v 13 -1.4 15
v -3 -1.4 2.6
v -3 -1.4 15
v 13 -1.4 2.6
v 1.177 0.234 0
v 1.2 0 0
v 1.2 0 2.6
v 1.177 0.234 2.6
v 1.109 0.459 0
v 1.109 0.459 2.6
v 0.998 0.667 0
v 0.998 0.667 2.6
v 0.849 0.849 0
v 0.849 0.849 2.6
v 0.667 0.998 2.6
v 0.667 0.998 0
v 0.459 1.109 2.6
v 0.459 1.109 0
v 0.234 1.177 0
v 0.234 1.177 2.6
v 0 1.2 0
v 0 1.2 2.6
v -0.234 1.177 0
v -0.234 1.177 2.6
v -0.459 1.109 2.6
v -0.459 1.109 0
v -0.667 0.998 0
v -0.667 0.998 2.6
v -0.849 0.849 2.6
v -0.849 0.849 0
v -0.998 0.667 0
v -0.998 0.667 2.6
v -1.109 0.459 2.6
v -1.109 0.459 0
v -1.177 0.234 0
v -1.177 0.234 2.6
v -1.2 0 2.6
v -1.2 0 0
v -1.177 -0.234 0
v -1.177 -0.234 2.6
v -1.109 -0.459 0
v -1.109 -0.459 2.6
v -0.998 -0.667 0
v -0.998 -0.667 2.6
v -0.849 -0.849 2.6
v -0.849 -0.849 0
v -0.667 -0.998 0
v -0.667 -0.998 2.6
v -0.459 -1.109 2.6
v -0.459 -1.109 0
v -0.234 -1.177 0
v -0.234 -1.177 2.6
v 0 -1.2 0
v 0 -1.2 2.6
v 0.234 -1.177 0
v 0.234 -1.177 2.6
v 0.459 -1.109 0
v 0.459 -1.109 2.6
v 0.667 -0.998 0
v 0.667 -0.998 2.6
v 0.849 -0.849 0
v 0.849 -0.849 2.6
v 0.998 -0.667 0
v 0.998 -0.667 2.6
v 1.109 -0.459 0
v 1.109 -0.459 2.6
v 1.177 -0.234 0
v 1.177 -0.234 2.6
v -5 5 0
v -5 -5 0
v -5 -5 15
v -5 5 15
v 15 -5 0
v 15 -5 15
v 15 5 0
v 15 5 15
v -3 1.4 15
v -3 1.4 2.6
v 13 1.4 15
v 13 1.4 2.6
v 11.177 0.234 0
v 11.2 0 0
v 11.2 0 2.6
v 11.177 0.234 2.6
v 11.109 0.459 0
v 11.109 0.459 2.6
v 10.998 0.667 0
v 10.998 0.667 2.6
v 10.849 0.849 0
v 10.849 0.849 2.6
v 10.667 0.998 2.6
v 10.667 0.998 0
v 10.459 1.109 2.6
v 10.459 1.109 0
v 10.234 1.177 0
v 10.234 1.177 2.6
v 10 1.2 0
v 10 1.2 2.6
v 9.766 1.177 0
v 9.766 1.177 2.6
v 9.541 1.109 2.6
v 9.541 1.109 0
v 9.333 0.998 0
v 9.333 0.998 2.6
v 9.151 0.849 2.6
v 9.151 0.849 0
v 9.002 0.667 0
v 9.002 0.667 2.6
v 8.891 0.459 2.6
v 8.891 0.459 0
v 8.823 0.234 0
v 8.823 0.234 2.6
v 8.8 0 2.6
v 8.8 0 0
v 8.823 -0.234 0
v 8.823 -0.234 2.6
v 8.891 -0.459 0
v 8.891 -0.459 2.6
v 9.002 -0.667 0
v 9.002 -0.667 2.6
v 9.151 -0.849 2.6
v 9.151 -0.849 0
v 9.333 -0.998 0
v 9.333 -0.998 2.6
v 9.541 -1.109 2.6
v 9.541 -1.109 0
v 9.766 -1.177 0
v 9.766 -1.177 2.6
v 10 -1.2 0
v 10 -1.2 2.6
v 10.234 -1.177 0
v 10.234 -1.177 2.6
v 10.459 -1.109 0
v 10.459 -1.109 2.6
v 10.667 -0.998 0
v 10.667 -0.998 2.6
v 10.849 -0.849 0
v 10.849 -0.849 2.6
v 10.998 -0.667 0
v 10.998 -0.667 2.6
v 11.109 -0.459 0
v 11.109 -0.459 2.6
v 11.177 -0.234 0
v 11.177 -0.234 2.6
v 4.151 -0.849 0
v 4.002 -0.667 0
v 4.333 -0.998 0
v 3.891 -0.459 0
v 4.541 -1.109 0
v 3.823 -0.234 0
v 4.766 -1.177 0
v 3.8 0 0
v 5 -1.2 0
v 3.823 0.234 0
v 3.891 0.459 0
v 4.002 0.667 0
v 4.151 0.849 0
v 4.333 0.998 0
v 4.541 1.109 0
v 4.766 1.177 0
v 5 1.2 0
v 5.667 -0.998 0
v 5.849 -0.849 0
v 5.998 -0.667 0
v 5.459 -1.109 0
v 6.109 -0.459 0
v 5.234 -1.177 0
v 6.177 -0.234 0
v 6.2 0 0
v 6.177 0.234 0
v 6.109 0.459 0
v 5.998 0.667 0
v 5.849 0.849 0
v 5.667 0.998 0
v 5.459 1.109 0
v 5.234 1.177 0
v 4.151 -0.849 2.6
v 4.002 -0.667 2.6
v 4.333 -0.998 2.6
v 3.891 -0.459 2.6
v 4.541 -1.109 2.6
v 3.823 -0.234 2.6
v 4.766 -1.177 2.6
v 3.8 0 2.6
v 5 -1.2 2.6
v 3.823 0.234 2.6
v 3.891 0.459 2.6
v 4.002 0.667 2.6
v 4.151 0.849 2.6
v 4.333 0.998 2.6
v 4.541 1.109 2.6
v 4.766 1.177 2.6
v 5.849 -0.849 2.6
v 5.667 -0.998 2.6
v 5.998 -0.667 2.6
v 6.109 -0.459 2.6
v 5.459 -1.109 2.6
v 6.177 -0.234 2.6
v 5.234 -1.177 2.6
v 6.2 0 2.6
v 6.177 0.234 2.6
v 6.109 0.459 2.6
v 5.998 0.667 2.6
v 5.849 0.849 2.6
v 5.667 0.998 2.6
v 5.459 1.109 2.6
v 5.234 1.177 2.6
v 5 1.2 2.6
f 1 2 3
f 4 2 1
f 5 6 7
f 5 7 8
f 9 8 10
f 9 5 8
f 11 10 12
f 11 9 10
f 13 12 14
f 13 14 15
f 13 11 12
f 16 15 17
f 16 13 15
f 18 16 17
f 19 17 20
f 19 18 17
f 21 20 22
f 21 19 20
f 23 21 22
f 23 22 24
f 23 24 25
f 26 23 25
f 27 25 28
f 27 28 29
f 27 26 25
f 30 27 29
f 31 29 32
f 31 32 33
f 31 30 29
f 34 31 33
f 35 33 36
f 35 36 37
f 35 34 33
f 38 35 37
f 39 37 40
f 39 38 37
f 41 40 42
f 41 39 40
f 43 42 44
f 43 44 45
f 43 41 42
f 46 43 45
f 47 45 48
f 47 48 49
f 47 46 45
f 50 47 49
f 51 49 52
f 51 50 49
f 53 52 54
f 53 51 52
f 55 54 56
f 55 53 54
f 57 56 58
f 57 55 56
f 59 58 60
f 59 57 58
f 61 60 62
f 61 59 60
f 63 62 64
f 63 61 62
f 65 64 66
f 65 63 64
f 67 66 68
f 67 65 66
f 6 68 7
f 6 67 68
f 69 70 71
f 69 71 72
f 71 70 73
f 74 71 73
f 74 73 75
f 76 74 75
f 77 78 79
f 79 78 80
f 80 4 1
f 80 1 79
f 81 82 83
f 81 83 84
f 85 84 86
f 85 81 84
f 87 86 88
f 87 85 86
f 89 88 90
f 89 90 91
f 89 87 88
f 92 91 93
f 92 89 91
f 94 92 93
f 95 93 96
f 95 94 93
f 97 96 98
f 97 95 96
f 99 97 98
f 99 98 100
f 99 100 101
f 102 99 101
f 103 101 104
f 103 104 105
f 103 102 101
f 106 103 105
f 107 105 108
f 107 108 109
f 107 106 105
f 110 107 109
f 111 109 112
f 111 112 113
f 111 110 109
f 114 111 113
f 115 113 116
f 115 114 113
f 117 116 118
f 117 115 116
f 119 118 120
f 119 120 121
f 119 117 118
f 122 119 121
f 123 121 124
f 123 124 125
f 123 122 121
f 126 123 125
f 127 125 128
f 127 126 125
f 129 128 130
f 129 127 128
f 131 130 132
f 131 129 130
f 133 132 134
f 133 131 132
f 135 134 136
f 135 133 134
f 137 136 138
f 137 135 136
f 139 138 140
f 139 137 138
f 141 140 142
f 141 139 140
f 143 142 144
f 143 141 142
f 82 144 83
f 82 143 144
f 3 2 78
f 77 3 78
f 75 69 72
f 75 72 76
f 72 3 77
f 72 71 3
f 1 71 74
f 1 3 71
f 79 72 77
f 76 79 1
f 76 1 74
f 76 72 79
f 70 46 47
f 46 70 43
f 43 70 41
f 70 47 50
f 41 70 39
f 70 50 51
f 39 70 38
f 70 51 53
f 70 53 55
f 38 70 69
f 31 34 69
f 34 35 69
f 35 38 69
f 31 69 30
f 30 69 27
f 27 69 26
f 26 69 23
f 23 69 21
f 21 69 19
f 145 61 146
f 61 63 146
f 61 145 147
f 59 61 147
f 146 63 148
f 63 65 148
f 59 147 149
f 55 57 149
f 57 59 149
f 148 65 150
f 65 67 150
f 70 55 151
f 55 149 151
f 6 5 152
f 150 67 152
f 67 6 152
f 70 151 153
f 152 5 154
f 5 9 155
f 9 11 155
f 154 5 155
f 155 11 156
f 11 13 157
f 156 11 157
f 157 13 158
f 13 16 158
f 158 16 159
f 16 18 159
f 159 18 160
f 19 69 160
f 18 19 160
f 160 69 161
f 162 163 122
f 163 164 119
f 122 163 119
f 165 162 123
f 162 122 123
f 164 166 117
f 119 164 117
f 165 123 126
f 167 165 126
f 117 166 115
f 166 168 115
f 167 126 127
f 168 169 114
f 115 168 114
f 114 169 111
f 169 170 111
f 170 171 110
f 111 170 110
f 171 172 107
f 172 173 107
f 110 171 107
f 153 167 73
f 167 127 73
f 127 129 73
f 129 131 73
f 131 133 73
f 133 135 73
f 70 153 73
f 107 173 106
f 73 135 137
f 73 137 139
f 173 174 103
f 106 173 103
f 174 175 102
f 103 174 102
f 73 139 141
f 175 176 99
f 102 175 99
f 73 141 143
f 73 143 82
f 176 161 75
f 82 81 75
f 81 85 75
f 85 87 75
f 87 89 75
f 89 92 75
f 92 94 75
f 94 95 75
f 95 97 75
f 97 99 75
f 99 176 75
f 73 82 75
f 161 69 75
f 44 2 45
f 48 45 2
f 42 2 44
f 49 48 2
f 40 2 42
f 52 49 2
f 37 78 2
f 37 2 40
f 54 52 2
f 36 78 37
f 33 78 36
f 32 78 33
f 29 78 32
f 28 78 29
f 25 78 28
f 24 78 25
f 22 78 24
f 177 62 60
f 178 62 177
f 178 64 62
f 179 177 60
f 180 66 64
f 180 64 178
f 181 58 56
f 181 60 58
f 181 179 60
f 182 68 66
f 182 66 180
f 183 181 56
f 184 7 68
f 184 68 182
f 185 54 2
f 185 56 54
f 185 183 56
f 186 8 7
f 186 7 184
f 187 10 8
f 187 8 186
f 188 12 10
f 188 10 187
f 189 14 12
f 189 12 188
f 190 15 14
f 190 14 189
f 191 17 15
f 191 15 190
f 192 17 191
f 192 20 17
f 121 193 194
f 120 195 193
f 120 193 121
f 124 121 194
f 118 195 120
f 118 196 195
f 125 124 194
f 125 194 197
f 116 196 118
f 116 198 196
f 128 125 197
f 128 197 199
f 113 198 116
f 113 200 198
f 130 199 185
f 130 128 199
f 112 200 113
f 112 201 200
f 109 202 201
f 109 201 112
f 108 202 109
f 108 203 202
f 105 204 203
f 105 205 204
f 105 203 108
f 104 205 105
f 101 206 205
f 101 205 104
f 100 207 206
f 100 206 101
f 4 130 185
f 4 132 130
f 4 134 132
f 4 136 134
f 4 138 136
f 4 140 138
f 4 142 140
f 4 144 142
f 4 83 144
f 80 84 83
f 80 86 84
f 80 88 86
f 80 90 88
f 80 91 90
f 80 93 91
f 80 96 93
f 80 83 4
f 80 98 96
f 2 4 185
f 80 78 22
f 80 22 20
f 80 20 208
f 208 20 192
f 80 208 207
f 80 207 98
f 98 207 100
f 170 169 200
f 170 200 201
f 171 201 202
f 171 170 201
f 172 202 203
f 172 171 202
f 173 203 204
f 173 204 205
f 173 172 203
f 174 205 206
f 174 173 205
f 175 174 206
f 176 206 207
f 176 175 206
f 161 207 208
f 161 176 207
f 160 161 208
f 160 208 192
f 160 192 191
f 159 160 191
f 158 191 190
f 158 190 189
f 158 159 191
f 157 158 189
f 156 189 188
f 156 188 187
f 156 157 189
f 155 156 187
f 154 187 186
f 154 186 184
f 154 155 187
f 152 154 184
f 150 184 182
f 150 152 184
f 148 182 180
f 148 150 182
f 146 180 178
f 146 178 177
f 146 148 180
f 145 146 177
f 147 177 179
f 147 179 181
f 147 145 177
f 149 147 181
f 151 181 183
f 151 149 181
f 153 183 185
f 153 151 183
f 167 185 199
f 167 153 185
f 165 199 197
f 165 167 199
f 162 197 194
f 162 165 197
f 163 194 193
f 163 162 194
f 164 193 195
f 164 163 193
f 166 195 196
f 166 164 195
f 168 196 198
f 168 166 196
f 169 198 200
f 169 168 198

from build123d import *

# Parameters (mm, degrees)
F0_W     = 16
F0_H     = 2.8
F0_R     = 1.2
F1_DEPTH = 2.6
F0_W_2   = 20
F0_H_2   = 10
F2_DEPTH = 15


with BuildPart() as f1:
    # F0 (on Top) → F1 (new body)
    with BuildSketch(Plane.XY):
        with Locations((5, 0)):
            Rectangle(F0_W, F0_H)
        Circle(F0_R, mode=Mode.SUBTRACT)
        with Locations((5, 0)):
            Circle(F0_R, mode=Mode.SUBTRACT)
        with Locations((10, 0)):
            Circle(F0_R, mode=Mode.SUBTRACT)
    extrude(amount=F1_DEPTH)

    # F0 (on Top) → F2 (join)
    with BuildSketch(Plane.XY):
        with Locations((5, 0)):
            Rectangle(F0_W_2, F0_H_2)
        with Locations((5, 0)):
            Rectangle(F0_W, F0_H, mode=Mode.SUBTRACT)
    extrude(amount=F2_DEPTH)


solid = f1.part
